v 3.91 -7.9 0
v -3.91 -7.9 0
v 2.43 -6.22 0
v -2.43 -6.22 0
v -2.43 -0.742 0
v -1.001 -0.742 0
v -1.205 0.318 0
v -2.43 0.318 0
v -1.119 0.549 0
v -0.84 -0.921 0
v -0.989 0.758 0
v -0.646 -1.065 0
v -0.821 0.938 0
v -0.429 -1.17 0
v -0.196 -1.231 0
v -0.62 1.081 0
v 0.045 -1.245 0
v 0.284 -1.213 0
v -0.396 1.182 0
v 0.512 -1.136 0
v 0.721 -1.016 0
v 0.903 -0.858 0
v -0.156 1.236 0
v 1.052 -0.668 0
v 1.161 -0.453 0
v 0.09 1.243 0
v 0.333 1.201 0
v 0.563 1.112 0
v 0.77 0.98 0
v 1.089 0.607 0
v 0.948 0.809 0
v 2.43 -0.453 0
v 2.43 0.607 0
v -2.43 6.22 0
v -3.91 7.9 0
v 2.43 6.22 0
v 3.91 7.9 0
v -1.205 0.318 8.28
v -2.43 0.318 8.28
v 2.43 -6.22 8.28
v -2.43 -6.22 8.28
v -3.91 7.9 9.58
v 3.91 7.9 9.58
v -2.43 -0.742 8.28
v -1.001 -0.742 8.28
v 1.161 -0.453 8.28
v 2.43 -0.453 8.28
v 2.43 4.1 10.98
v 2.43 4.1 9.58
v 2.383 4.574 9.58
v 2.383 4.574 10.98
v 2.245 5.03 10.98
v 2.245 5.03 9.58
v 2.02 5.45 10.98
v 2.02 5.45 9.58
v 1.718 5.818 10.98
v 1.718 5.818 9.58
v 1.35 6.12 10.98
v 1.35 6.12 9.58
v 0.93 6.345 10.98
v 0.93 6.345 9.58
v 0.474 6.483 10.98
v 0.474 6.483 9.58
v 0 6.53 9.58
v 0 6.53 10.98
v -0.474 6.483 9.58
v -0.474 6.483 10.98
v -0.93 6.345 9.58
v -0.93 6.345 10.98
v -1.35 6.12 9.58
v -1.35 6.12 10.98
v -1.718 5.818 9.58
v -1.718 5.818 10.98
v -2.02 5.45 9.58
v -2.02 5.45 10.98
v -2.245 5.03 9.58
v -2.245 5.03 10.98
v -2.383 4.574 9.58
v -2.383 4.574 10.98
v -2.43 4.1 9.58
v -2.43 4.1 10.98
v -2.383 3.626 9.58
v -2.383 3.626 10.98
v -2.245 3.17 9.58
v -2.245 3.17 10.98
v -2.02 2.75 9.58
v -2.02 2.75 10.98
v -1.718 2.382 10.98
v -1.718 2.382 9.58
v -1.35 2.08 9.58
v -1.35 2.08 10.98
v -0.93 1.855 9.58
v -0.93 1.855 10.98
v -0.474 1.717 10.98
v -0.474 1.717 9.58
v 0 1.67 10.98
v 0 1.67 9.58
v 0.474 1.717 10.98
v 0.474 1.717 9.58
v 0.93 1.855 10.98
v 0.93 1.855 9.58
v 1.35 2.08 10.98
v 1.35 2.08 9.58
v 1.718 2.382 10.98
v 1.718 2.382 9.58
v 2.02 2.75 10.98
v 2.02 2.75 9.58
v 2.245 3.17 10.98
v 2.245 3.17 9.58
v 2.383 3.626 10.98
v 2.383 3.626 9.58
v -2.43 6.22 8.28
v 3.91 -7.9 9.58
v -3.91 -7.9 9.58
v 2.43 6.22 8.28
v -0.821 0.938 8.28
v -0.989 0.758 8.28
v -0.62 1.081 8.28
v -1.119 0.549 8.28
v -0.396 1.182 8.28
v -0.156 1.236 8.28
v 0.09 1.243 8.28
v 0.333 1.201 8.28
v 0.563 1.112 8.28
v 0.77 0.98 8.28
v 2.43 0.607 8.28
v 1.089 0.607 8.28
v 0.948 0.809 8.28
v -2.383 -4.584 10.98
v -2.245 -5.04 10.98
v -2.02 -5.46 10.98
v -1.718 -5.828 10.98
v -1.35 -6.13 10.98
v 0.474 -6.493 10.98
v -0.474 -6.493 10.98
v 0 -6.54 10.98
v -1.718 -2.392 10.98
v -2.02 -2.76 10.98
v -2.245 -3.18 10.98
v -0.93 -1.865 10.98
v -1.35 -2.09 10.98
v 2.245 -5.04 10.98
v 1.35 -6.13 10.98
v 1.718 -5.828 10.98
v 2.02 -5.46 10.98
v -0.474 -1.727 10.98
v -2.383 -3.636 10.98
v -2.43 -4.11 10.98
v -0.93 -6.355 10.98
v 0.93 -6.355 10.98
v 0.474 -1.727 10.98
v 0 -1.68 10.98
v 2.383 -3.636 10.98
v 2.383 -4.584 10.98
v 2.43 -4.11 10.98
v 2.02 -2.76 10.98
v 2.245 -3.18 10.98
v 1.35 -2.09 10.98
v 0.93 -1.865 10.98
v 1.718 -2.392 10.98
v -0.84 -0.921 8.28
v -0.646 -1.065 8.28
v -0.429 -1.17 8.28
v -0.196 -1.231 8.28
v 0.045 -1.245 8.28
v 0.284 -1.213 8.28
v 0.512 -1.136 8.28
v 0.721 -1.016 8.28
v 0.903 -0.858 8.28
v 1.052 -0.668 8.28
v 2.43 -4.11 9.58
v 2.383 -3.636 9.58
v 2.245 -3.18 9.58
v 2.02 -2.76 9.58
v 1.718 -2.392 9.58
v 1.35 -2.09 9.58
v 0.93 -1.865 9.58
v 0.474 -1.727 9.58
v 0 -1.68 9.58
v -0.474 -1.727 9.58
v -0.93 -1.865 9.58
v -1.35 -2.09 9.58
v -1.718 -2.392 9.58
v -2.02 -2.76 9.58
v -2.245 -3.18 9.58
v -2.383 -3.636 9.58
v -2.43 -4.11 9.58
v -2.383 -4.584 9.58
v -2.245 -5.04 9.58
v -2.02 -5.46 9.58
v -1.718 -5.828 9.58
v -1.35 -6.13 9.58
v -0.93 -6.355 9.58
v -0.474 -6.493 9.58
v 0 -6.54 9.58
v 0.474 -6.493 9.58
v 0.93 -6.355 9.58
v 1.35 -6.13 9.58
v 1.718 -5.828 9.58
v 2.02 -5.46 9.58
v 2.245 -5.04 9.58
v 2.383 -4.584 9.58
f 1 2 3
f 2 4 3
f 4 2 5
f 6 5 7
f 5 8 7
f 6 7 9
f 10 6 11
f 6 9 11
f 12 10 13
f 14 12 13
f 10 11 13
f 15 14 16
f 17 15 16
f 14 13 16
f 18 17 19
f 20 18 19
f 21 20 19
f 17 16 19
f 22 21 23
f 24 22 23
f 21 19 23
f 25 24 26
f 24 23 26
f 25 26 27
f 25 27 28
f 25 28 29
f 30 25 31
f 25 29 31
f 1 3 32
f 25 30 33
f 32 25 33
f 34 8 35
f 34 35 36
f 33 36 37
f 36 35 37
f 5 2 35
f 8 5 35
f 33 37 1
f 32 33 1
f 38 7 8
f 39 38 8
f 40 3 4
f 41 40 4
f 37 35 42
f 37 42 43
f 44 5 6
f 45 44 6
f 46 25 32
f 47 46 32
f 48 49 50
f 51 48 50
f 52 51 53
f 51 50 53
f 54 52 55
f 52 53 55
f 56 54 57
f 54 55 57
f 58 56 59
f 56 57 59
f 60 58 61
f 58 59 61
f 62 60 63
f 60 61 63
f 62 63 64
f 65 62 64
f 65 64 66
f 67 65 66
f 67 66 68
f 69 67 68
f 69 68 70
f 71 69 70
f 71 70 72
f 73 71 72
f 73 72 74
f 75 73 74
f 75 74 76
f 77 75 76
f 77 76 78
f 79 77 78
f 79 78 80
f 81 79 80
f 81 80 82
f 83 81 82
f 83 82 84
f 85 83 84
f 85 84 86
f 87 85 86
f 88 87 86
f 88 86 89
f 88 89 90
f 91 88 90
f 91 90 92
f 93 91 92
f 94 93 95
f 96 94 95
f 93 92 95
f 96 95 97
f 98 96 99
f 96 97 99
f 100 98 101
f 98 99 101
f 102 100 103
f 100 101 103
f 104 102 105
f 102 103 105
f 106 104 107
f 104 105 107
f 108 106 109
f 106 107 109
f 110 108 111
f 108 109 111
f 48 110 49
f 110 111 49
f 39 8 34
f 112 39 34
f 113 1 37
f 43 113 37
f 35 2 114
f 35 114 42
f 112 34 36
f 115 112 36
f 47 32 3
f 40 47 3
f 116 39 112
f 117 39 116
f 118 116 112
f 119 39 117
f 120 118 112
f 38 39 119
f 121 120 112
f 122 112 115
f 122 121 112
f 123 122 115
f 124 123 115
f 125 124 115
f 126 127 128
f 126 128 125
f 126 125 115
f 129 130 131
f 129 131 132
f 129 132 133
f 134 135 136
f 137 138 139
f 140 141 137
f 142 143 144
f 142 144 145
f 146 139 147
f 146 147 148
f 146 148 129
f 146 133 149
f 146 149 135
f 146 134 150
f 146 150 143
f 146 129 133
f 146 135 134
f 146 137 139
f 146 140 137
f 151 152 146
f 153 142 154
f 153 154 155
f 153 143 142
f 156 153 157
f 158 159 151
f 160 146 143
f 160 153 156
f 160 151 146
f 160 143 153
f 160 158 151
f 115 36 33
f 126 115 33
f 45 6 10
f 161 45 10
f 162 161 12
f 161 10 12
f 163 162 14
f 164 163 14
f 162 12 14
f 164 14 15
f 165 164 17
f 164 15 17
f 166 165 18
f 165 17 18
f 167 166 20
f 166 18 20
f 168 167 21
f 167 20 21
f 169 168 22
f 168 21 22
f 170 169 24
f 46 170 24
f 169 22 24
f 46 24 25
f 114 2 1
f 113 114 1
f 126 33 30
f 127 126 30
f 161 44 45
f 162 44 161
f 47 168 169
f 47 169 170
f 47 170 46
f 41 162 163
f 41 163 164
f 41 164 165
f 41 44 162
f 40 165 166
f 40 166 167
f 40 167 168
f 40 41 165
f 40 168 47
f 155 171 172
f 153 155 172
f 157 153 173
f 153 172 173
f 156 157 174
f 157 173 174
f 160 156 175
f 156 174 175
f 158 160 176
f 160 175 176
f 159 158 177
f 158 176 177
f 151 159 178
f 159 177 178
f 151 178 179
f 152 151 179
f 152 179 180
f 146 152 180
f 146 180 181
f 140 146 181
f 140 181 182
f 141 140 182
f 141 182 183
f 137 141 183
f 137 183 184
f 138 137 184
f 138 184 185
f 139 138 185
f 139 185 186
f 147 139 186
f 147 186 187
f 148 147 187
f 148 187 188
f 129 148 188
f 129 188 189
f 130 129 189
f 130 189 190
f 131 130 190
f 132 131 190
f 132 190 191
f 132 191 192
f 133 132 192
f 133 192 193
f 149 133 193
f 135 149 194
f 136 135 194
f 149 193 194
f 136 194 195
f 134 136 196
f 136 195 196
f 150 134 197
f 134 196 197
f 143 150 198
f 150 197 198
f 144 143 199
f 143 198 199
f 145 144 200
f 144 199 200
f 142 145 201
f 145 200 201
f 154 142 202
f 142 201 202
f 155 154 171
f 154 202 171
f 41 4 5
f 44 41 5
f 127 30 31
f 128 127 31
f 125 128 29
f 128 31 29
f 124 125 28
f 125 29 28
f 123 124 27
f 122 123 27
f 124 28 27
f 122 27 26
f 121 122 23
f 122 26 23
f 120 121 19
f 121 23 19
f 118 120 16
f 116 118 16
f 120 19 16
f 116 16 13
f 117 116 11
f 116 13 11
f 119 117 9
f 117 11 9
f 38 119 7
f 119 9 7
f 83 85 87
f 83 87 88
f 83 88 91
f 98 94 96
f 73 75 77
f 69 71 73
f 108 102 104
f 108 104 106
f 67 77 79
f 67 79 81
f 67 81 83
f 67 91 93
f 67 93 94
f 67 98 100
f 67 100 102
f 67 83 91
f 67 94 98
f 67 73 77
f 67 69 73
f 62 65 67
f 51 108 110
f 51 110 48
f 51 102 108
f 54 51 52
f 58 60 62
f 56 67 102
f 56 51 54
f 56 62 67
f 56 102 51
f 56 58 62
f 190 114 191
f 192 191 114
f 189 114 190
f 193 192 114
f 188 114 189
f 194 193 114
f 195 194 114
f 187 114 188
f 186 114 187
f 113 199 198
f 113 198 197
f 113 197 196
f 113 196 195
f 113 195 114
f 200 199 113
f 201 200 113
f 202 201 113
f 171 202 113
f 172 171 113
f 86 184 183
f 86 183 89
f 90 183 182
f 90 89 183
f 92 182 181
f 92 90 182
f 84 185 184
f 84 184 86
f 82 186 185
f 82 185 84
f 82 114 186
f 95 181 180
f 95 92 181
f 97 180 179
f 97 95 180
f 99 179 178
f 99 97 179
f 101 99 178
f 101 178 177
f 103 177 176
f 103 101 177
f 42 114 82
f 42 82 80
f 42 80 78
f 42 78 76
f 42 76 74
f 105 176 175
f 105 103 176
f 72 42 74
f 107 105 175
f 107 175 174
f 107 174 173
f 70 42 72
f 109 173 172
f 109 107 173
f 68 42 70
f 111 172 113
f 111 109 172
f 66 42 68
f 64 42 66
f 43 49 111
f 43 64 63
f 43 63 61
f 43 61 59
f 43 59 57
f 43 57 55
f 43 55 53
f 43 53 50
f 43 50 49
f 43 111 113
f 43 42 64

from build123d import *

# Parameters (mm, degrees)
F0_W     = 7.82
F0_H     = 15.8
F0_R     = 2.43
F1_DEPTH = 9.58
F2_DEPTH = 10.98
F4_DEPTH = 8.28


with BuildPart() as f1:
    # F0 (on Top) → F1 (new body)
    with BuildSketch(Plane.XY):
        Rectangle(F0_W, F0_H)
        with Locations((0, -4.11)):
            Circle(F0_R, mode=Mode.SUBTRACT)
        with Locations((0, 4.1)):
            Circle(F0_R, mode=Mode.SUBTRACT)
        with Locations((0, -4.11)):
            Circle(F0_R)
        with Locations((0, 4.1)):
            Circle(F0_R)
    extrude(amount=F1_DEPTH)

    # F0 (on Top) → F2 (join)
    with BuildSketch(Plane.XY):
        with Locations((0, -4.11)):
            Circle(F0_R)
        with Locations((0, 4.1)):
            Circle(F0_R)
    extrude(amount=F2_DEPTH)

    # F3 (on face) → F4 (cut)
    with BuildSketch(Plane(origin=(0, 0, 0), x_dir=(1, 0, 0), z_dir=(0, 0, -1))):
        with BuildLine():
            Line((-2.43, -0.317888), (-2.43, -6.22))
            Line((-2.43, -6.22), (2.43, -6.22))
            Line((2.43, -6.22), (2.43, -0.606731))
            Line((2.43, -0.606731), (1.088562, -0.606731))
            ThreePointArc((1.088562, -0.606731), (-0.155715, -1.236463), (-1.205005, -0.317888))
            Line((-1.205005, -0.317888), (-2.43, -0.317888))
        make_face()
        with BuildLine():
            Line((-2.43, 6.22), (-2.43, 0.742112))
            Line((-2.43, 0.742112), (-1.001179, 0.742112))
            ThreePointArc((-1.001179, 0.742112), (0.165026, 1.235255), (1.160877, 0.453269))
            Line((1.160877, 0.453269), (2.43, 0.453269))
            Line((2.43, 0.453269), (2.43, 6.22))
            Line((2.43, 6.22), (-2.43, 6.22))
        make_face()
    extrude(amount=-F4_DEPTH, mode=Mode.SUBTRACT)


solid = f1.part
